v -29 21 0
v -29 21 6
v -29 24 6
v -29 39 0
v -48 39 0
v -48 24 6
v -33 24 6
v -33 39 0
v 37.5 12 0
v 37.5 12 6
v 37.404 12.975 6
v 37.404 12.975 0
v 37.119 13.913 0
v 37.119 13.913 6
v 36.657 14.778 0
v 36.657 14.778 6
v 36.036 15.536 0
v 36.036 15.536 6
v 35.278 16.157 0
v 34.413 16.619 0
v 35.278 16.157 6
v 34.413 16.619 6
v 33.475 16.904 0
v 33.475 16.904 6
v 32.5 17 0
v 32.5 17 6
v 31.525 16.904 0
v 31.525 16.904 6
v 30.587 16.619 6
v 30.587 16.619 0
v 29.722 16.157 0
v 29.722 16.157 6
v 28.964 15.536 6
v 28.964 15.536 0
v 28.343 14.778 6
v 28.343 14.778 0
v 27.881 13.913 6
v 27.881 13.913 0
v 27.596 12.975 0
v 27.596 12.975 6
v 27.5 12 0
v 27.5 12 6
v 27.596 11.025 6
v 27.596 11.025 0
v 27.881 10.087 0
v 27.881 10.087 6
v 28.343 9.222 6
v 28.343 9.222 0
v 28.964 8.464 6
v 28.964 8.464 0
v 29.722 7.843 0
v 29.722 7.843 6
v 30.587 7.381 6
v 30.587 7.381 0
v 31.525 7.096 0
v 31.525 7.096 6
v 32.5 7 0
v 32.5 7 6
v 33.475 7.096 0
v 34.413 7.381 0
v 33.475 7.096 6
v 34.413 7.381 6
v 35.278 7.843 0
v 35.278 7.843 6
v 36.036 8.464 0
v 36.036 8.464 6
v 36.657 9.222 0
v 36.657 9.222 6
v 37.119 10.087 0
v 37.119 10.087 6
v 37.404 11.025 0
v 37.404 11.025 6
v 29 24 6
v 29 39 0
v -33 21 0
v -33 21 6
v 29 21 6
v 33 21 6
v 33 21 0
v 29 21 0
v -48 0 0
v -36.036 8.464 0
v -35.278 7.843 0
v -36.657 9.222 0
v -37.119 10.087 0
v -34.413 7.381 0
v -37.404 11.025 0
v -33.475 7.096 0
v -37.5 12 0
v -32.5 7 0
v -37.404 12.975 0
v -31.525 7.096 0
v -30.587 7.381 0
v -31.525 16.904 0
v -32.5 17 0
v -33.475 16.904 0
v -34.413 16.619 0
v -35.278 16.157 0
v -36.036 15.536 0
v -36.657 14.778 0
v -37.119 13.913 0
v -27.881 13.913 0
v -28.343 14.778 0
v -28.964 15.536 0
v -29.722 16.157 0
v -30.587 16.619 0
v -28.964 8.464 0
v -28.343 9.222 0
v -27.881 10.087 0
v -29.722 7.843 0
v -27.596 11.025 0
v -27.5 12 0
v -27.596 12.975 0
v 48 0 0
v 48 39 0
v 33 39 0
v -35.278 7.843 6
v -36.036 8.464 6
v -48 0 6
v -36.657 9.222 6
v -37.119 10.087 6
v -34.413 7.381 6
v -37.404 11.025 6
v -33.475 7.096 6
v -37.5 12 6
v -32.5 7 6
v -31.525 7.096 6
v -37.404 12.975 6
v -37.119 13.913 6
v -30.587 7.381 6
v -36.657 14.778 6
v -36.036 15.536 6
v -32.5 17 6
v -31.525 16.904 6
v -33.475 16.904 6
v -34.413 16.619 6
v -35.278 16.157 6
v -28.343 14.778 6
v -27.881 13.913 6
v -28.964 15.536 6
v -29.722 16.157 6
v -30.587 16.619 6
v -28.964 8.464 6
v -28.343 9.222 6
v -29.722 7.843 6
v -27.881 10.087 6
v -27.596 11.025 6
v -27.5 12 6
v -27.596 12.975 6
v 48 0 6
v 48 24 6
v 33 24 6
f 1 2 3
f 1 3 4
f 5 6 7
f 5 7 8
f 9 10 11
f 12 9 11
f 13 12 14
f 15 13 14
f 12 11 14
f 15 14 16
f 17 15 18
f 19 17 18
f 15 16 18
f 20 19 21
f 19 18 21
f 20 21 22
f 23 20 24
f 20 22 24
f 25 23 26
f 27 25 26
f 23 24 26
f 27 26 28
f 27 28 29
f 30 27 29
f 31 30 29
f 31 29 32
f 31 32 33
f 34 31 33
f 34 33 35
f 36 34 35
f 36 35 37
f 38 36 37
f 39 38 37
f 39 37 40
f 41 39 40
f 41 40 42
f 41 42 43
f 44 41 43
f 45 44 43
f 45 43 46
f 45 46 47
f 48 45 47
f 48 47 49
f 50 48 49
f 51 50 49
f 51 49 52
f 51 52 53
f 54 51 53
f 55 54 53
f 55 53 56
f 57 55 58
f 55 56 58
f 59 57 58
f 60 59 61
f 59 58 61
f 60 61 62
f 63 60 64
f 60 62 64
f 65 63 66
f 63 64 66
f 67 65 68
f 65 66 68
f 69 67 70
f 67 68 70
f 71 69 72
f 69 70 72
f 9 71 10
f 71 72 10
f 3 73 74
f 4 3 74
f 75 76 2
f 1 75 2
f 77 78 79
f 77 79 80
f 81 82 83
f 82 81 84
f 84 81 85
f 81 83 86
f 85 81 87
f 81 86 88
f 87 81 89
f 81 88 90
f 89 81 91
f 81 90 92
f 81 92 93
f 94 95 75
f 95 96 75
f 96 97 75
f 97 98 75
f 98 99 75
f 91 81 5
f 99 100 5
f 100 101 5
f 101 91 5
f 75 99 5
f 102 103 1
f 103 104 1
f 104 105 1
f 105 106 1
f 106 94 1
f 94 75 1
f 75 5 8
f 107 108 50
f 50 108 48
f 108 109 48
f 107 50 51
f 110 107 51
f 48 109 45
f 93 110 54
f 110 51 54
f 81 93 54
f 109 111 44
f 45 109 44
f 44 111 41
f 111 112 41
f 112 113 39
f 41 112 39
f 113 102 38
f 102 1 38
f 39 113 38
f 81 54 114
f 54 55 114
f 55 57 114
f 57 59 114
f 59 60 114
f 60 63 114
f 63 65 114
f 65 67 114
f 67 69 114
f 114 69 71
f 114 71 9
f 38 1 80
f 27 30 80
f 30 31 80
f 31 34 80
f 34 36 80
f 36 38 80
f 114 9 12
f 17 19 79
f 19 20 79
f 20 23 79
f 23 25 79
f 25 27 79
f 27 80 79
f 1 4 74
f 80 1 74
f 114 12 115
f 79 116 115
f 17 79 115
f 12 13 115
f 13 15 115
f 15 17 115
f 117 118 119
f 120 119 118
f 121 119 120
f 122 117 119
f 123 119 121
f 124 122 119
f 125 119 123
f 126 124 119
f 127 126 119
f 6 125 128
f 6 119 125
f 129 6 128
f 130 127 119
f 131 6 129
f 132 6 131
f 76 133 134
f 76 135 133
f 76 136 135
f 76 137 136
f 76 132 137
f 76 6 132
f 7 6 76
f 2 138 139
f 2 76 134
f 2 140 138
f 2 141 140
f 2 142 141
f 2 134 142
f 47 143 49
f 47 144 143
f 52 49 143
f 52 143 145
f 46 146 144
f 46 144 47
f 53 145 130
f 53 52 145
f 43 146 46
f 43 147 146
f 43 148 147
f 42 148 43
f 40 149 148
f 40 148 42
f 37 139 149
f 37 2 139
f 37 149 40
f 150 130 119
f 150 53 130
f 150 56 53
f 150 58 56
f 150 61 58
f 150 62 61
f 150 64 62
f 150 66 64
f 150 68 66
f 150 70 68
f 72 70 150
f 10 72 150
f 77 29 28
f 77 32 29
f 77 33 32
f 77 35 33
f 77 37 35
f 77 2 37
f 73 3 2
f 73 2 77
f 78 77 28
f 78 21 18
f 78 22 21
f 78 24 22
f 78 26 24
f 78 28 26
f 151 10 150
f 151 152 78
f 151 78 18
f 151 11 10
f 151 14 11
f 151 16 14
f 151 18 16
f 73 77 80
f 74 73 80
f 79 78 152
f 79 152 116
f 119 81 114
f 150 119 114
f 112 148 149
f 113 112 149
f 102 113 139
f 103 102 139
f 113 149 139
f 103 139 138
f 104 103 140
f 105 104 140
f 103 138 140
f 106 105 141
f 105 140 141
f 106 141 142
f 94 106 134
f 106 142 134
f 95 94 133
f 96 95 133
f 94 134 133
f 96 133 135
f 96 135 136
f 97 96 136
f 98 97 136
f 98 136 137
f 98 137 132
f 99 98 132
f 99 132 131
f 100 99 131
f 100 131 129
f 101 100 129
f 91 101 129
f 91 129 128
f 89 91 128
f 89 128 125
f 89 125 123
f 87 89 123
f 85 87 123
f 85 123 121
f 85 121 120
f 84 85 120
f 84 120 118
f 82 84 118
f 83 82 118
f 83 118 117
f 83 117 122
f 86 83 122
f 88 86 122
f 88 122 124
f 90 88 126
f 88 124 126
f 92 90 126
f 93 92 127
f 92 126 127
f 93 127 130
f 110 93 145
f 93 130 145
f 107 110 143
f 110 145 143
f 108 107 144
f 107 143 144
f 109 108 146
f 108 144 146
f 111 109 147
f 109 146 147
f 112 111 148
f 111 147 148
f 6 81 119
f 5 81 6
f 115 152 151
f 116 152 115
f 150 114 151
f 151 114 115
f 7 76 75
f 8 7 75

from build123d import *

# Parameters (mm, degrees)
SKETCH_1_W               = 96
SKETCH_1_H               = 39
EXTRUDE_1_DEPTH          = 6
CUT_EXTRUDE_1_DEPTH      = 104.793063352
CUT_EXTRUDE_1_DEPTH_BACK = 104.793063352
SKETCH_3_W               = 4
SKETCH_3_H               = 18
CUT_EXTRUDE_1_2_DEPTH    = 63.136945532
SKETCH_4_R               = 5
CUT_EXTRUDE_2_DEPTH      = 63.136945532


with BuildPart() as part:
    # 草图1 → 凸台-拉伸1 (new body)
    with BuildSketch(Plane.XY):
        with Locations((0, 19.5)):
            Rectangle(SKETCH_1_W, SKETCH_1_H)
    extrude(amount=EXTRUDE_1_DEPTH)

    # 草图2 → Cut-Extrude 1 (cut, two sides: drawn at the far end of the back side and taken through both)
    with BuildSketch(Plane(origin=(48, 0, 0), x_dir=(0, 0, -1), z_dir=(1, 0, 0)).offset(-CUT_EXTRUDE_1_DEPTH_BACK)):
        Polygon((-39.023196805, -58.557992014), (-6, 24), (0, 39), (33.023196805, 121.557992014), (-132.092787222, 187.604385624), (-204.139180832, 7.488401597), align=None)
    extrude(amount=CUT_EXTRUDE_1_DEPTH + CUT_EXTRUDE_1_DEPTH_BACK, mode=Mode.SUBTRACT)

    # 草图3 → Cut-Extrude 1 2 (cut, symmetric)
    with BuildSketch(Plane.XY.offset(6)):
        with Locations((-31, 30)):
            Rectangle(SKETCH_3_W, SKETCH_3_H)
    cut_extrude_1_2 = extrude(amount=CUT_EXTRUDE_1_2_DEPTH, both=True, mode=Mode.SUBTRACT)

    # 镜向1: Cut-Extrude 1 2 across plane
    add(cut_extrude_1_2.mirror(Plane(origin=(0, 0, 0), x_dir=(0, 0, 1), z_dir=(1, 0, 0))), mode=Mode.SUBTRACT)

    # 草图4 → 切除-拉伸2 (cut, through all)
    with BuildSketch(Plane.XY.offset(6)):
        with Locations((32.5, 12)):
            Circle(SKETCH_4_R)
        with Locations((-32.5, 12)):
            Circle(SKETCH_4_R)
    extrude(amount=-CUT_EXTRUDE_2_DEPTH, mode=Mode.SUBTRACT)


solid = part.part
